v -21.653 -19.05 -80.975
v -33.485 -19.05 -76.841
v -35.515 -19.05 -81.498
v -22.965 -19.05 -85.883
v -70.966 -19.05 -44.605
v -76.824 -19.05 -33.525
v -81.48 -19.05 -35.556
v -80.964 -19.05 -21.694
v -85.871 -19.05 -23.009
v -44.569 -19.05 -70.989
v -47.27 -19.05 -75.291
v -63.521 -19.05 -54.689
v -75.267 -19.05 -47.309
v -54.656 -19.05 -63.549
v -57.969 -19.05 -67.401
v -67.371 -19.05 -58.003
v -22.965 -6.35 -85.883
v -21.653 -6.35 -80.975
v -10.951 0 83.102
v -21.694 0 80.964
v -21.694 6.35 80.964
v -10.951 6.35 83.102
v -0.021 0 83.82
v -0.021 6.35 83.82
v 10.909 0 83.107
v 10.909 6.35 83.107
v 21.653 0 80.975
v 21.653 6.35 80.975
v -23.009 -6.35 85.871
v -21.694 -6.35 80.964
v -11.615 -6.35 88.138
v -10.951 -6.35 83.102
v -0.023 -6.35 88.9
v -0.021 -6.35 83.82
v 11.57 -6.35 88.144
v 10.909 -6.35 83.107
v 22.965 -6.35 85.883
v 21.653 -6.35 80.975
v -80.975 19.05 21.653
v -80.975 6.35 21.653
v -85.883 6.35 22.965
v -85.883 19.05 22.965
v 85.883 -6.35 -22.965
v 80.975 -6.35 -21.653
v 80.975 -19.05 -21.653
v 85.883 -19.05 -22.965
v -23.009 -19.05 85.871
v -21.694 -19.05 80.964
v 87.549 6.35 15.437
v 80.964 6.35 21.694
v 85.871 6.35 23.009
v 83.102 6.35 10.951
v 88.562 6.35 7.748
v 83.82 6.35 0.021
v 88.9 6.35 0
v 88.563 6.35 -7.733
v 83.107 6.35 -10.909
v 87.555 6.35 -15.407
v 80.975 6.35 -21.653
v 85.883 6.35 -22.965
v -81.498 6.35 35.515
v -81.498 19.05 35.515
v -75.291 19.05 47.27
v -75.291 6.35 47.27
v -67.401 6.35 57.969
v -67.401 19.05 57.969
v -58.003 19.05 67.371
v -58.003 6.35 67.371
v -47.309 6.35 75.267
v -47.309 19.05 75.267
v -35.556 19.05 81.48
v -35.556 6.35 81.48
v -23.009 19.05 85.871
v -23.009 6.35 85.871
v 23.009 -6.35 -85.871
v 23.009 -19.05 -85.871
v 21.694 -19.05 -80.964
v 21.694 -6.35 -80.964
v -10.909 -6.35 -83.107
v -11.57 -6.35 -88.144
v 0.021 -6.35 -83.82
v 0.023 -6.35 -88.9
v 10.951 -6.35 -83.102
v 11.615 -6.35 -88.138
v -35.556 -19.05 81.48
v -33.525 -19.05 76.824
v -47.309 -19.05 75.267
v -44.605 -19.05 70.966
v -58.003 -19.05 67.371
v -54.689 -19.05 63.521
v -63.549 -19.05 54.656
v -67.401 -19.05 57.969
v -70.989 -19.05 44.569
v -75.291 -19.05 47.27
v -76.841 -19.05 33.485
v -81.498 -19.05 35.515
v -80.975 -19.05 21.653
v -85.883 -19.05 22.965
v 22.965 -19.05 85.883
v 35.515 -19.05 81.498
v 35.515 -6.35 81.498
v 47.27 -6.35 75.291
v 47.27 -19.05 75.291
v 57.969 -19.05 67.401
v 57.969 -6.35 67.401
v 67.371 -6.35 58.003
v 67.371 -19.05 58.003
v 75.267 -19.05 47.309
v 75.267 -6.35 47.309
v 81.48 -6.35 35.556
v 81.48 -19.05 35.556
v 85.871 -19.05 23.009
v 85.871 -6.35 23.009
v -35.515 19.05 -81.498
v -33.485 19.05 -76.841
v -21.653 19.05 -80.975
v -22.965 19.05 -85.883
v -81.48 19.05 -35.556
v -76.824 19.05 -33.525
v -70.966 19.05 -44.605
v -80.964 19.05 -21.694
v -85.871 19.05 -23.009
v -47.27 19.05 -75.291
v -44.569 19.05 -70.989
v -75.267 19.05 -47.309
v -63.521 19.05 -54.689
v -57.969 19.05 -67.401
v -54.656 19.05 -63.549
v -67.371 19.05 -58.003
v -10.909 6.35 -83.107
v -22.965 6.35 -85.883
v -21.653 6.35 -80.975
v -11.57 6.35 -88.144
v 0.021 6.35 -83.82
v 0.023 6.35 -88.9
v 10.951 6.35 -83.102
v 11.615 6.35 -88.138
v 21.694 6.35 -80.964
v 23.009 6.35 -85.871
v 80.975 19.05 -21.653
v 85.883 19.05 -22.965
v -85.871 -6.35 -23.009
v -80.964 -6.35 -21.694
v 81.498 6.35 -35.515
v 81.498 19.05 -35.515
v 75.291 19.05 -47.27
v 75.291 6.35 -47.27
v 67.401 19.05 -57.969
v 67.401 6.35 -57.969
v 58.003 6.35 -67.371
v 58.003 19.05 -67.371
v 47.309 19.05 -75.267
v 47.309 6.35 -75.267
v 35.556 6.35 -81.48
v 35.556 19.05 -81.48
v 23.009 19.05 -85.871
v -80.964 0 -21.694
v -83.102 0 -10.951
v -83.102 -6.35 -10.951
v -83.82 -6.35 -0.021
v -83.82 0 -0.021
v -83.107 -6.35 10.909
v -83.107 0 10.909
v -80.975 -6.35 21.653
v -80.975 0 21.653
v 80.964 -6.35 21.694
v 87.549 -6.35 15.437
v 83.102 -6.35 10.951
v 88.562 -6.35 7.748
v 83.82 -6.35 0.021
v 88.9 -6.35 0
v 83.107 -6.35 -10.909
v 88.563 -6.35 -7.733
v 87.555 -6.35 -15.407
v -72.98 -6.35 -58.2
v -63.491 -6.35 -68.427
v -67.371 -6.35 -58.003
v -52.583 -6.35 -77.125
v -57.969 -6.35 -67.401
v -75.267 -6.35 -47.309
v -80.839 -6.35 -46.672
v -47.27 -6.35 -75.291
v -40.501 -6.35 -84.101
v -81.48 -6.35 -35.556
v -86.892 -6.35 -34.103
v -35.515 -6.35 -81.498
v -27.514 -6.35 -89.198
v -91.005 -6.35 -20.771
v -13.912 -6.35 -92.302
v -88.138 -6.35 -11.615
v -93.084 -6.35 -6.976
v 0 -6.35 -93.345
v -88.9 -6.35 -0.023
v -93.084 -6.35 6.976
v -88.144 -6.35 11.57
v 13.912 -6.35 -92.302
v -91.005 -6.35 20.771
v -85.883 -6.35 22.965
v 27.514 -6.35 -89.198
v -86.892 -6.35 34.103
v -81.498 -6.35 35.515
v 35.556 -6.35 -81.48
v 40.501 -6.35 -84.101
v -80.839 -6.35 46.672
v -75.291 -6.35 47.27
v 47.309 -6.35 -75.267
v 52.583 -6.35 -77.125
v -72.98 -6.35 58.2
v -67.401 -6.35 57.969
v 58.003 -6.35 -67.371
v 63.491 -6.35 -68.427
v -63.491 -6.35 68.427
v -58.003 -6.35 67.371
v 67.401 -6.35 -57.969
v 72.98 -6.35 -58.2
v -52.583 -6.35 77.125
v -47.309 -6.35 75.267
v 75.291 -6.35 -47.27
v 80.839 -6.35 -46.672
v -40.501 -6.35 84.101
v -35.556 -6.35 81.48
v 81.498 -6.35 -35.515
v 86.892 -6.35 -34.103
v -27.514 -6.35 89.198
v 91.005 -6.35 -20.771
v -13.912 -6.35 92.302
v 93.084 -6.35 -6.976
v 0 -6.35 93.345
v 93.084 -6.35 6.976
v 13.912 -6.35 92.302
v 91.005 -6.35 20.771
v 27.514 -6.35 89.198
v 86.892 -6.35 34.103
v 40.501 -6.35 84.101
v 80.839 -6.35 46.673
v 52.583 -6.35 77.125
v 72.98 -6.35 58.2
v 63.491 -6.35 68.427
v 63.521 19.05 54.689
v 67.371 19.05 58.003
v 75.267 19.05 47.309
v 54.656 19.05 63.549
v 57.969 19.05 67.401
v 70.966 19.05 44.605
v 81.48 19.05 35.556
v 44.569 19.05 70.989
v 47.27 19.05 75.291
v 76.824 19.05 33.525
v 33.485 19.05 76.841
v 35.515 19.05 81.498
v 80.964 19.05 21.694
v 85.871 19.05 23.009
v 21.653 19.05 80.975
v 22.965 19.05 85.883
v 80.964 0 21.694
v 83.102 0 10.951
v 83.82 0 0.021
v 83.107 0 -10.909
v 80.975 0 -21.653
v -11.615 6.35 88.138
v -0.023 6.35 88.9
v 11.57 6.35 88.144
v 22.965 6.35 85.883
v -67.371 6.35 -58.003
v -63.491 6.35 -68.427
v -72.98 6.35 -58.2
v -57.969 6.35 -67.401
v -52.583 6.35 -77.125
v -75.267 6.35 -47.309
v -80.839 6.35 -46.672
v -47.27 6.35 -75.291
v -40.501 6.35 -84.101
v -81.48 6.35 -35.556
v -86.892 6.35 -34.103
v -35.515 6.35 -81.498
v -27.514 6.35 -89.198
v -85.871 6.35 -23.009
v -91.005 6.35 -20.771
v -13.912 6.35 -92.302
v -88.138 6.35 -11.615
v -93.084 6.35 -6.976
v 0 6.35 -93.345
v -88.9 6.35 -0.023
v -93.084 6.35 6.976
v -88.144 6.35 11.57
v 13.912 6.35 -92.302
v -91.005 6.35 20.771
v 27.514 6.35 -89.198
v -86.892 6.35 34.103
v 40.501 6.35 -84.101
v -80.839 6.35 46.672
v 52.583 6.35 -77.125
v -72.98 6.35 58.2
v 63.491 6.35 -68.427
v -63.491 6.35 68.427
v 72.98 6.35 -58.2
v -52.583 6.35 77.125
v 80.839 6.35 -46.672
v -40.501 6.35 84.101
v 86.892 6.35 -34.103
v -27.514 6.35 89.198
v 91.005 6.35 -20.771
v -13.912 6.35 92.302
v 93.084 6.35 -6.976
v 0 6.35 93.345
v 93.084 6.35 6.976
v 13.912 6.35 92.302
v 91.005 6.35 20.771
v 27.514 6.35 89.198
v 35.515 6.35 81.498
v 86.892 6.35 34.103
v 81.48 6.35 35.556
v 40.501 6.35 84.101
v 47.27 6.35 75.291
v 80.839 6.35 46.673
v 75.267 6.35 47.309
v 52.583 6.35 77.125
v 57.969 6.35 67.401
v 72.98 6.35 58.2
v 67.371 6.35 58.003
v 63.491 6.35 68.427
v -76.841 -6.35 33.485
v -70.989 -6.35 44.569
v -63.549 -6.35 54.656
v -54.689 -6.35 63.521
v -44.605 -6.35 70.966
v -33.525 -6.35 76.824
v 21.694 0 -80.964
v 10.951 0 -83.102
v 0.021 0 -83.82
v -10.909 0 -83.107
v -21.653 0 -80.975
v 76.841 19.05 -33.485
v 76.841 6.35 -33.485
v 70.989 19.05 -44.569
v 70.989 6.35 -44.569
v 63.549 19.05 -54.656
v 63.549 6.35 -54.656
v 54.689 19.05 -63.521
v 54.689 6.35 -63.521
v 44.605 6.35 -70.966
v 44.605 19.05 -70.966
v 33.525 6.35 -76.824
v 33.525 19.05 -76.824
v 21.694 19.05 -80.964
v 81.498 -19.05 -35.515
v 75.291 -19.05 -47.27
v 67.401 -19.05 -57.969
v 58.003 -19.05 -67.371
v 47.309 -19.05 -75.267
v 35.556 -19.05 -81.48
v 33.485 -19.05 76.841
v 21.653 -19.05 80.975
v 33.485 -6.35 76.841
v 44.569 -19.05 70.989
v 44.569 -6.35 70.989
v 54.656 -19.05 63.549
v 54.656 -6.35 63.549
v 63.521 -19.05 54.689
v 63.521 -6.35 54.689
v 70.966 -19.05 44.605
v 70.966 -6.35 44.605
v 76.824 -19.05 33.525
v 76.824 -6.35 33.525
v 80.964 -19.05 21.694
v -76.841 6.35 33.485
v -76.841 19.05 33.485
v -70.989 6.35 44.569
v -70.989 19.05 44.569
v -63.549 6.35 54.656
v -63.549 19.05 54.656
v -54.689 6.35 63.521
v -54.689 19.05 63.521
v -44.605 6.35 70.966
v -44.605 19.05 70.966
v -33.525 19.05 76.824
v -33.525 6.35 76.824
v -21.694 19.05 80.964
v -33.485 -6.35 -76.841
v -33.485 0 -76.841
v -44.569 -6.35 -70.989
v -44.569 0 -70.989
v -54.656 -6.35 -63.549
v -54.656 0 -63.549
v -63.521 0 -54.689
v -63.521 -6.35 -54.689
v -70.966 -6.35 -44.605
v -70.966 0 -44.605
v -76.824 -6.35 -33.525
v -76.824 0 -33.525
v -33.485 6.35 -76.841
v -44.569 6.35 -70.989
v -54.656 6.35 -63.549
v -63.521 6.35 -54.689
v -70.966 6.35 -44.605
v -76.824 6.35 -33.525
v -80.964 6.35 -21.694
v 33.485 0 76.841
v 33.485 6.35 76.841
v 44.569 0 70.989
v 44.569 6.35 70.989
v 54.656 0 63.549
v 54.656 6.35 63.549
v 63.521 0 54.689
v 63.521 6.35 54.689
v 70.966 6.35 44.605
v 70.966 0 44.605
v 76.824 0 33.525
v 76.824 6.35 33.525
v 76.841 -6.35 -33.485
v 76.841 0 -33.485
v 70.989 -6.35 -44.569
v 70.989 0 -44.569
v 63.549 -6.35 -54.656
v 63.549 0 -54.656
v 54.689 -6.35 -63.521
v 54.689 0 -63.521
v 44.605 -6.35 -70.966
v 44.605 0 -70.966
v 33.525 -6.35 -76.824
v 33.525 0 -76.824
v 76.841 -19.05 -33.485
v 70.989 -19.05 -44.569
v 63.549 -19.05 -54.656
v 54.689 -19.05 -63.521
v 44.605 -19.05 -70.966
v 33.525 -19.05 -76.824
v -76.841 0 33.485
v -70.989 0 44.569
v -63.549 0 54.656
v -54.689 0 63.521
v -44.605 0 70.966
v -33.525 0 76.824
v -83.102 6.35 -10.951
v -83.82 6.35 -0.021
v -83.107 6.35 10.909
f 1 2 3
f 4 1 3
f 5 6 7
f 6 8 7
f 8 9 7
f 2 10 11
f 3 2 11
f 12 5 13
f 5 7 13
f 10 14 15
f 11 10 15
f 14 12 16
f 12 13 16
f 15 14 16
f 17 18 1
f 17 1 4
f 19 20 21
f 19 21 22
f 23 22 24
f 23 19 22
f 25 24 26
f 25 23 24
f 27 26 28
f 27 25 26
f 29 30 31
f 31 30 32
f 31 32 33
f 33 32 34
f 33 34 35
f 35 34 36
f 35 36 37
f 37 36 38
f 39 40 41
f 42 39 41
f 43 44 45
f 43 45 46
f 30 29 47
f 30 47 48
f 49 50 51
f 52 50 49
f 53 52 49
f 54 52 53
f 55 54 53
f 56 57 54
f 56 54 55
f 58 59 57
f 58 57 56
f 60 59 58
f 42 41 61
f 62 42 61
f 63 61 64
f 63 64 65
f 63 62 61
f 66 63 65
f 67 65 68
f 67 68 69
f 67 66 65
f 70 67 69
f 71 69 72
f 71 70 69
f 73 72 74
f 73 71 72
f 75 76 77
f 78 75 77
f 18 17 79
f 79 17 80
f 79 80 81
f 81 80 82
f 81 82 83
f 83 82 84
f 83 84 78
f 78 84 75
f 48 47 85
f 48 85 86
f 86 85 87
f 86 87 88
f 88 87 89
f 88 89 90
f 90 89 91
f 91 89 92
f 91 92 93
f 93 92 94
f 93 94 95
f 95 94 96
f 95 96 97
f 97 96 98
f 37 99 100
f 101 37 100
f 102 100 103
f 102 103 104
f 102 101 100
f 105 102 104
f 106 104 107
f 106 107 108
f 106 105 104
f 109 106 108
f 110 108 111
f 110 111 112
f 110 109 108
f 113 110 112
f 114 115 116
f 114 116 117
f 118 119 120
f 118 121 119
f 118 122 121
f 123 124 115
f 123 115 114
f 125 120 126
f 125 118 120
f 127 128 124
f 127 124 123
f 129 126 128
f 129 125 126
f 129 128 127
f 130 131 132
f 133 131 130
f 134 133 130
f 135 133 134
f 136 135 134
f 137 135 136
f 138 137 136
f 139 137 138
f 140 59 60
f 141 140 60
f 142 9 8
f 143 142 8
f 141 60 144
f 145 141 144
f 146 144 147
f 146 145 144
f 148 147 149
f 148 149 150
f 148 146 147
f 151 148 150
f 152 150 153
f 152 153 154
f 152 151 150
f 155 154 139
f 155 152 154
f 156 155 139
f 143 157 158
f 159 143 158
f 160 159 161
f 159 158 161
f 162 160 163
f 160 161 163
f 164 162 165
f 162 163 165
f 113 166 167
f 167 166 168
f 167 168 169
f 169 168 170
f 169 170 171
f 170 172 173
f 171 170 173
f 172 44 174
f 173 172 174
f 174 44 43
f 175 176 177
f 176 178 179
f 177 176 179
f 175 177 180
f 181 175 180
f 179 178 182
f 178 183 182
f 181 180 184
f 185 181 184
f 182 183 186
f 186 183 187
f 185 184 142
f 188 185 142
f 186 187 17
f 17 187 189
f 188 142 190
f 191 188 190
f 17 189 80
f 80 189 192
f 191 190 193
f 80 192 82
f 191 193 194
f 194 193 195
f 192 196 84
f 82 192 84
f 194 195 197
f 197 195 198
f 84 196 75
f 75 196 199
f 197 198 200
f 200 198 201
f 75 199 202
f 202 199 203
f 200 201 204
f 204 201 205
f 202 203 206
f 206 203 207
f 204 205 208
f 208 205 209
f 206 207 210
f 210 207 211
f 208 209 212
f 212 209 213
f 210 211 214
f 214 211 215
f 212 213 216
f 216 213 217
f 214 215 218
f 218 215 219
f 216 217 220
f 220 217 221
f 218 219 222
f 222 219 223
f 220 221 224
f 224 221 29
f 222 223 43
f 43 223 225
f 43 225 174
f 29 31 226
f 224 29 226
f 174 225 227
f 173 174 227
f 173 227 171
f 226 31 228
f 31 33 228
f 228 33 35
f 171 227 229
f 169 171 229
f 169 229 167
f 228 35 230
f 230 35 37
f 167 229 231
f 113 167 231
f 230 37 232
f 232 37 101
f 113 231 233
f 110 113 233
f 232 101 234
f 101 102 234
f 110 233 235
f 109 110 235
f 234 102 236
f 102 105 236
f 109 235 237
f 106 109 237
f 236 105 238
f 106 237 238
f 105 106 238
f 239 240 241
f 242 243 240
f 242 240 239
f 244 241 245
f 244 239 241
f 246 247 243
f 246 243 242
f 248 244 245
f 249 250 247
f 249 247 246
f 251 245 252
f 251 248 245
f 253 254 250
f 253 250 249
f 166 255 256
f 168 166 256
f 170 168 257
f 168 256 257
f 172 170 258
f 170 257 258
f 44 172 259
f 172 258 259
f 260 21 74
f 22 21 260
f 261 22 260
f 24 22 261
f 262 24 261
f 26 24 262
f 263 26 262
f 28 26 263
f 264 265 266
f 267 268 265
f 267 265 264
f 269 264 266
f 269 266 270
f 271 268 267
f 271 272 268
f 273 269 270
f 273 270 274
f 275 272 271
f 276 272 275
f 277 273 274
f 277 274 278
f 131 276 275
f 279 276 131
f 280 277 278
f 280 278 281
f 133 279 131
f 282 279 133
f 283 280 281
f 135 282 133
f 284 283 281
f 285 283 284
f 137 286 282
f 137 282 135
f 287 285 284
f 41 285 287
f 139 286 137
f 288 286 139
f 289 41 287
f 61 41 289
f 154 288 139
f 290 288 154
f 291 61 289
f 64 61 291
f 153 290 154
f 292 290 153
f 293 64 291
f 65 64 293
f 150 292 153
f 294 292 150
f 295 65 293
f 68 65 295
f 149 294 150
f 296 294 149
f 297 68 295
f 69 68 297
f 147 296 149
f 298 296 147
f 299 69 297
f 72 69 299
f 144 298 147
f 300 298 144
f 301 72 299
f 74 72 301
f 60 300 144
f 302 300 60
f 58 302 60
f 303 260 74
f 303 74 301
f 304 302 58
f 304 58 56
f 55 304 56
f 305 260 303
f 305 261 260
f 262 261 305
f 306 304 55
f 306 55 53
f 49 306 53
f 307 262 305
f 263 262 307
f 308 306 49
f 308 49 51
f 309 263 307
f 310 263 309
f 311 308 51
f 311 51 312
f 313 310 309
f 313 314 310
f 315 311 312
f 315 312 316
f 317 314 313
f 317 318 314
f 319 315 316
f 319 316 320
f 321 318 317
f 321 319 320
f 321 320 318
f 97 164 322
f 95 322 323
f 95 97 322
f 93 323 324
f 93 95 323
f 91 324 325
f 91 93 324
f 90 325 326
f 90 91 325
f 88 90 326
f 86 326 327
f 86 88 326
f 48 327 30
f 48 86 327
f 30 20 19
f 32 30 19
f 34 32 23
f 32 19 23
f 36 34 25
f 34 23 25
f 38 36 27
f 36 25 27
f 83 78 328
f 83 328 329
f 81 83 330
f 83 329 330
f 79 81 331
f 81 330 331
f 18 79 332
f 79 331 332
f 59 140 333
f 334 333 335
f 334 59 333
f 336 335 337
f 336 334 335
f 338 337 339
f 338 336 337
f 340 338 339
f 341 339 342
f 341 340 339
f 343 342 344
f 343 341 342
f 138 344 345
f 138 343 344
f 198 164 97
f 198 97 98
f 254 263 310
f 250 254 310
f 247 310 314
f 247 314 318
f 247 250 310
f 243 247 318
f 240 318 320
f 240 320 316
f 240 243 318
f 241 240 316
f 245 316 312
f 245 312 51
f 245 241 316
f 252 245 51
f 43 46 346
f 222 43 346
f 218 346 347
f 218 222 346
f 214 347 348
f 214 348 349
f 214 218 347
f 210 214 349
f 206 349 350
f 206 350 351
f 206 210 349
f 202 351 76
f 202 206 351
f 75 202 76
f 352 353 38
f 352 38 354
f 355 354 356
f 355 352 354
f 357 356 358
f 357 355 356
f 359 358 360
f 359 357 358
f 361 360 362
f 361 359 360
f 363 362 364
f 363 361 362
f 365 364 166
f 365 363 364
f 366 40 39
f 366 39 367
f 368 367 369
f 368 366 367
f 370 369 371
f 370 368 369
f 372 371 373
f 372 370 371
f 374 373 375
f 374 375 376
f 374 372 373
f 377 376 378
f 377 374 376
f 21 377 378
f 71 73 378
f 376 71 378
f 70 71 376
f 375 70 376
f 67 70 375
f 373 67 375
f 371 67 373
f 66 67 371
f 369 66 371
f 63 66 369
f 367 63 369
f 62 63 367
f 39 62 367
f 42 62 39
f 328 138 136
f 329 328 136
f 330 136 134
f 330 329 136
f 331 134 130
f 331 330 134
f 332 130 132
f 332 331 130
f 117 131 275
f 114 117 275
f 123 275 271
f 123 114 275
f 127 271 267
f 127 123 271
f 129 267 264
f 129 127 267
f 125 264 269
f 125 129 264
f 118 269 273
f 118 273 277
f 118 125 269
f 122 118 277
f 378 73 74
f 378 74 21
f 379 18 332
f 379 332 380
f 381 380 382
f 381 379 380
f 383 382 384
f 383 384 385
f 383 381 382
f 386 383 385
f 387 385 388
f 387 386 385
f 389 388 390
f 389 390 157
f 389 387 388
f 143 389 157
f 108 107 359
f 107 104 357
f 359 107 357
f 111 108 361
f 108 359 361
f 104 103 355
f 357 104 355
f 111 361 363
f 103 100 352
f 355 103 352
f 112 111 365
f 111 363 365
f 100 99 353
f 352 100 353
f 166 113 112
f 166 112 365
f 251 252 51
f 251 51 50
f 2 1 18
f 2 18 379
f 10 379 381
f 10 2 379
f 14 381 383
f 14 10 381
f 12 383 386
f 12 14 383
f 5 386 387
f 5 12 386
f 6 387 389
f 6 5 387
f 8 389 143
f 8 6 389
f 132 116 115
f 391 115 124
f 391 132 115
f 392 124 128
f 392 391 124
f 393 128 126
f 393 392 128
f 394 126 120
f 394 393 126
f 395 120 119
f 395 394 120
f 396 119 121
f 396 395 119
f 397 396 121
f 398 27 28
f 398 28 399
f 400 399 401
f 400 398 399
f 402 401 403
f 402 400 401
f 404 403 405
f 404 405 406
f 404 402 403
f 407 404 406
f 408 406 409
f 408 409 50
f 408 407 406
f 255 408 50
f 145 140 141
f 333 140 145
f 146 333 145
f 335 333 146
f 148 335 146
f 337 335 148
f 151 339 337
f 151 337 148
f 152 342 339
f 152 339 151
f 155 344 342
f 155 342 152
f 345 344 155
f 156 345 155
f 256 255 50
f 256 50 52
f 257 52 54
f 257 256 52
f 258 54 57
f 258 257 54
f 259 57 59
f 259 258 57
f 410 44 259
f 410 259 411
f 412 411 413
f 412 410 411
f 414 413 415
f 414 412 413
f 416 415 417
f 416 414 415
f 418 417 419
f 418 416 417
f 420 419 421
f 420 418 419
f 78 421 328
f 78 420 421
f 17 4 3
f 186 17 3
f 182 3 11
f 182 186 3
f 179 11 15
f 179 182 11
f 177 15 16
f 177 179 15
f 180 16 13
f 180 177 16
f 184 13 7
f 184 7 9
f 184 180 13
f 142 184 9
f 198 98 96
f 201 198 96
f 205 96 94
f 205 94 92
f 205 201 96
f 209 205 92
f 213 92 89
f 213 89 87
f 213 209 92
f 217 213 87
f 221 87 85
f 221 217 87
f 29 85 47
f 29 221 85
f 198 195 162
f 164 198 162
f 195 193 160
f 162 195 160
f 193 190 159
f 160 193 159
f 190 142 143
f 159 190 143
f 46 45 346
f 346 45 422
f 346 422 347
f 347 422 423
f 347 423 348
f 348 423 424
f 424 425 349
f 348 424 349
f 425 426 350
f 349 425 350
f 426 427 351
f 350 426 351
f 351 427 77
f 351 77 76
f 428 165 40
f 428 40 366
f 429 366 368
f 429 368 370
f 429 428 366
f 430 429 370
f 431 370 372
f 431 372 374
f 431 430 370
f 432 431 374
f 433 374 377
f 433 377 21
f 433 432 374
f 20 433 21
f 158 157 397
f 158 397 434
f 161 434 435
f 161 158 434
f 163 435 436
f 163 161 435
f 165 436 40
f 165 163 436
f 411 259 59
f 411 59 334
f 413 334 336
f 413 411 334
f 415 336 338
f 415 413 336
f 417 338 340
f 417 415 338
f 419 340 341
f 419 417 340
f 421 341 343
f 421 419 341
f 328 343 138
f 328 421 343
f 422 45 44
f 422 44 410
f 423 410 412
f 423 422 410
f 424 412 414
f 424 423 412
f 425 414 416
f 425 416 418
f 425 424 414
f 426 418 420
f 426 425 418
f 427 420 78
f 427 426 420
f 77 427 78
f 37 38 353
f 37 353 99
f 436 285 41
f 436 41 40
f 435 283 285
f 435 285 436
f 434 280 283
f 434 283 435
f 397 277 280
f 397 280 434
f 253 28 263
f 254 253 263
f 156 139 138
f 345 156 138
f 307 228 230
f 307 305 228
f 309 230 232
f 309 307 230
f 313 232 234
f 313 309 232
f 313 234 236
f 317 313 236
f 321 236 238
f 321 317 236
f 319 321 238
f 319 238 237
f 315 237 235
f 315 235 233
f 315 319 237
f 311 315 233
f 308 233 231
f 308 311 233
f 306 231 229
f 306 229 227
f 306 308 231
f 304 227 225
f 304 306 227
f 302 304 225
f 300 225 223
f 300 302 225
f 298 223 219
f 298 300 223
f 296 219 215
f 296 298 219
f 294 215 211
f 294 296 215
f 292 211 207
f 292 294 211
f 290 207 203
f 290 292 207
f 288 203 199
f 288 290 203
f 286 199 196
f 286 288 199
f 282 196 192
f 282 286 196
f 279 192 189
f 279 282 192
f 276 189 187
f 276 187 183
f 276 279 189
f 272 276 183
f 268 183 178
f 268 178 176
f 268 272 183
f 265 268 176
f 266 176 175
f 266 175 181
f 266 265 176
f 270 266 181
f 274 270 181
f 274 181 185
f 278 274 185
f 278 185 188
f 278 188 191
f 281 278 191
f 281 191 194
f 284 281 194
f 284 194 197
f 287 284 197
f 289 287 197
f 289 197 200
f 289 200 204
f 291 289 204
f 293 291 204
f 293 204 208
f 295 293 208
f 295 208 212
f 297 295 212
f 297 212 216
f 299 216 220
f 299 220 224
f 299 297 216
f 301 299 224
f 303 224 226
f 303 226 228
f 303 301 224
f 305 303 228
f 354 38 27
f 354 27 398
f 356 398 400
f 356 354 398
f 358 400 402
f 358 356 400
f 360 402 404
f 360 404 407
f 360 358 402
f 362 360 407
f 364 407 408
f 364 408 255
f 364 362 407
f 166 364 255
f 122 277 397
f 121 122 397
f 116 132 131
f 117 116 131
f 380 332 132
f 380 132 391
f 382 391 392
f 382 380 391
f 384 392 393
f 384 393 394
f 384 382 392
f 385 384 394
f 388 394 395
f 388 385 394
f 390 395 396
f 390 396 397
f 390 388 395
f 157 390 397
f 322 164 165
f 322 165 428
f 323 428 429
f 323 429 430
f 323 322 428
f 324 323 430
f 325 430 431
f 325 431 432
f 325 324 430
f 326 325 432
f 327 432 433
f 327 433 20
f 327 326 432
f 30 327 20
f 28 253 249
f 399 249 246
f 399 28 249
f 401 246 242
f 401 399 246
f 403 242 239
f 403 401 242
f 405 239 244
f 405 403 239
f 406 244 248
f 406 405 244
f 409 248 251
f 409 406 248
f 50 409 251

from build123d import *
from build123d.topology import SkipClean

# Parameters (mm, degrees)
SKETCH1_R           = 93.345
SKETCH1_R_2         = 83.82
BOSS_EXTRUDE1_DEPTH = 6.35
SKETCH2_R           = 88.9
SKETCH2_R_2         = 83.82
BOSS_EXTRUDE2_DEPTH = 19.05
CUT_EXTRUDE1_DEPTH  = 38.1
CIRPATTERN1_COUNT   = 4
SKETCH4_R           = 88.9
SKETCH4_R_2         = 83.82
BOSS_EXTRUDE3_DEPTH = 6.35


with BuildPart() as part:
    # Sketch1 → Boss-Extrude1 (new, symmetric)
    with BuildSketch(Plane(origin=(0, 0, 0), x_dir=(1, 0, 0), z_dir=(0, 1, 0))):
        with Locations(Location((0, 0, 0), (0, 0, 270))):
            Circle(SKETCH1_R)
        with Locations(Location((0, 0, 0), (0, 0, 270))):
            Circle(SKETCH1_R_2, mode=Mode.SUBTRACT)
    extrude(amount=BOSS_EXTRUDE1_DEPTH, both=True)

    # Sketch2 → Boss-Extrude2 (add, symmetric)
    with BuildSketch(Plane(origin=(0, 0, 0), x_dir=(1, 0, 0), z_dir=(0, 1, 0))):
        with Locations(Location((0, 0, 0), (0, 0, 90))):
            Circle(SKETCH2_R)
        with Locations(Location((0, 0, 0), (0, 0, 270))):
            Circle(SKETCH2_R_2, mode=Mode.SUBTRACT)
    extrude(amount=BOSS_EXTRUDE2_DEPTH, both=True)

    # Sketch3 → Cut-Extrude1 (cut, symmetric)
    with BuildSketch(Plane(origin=(0, 0, 0), x_dir=(1, 0, 0), z_dir=(0, 1, 0))):
        with BuildLine():
            Line((0, 0), (-22.96498538, 85.882591056))
            ThreePointArc((-22.96498538, 85.882591056), (0.022788865, 88.899997079), (23.00901311, 85.870805957))
            Line((23.00901311, 85.870805957), (0, 0))
        make_face()
    cut_extrude1 = extrude(amount=CUT_EXTRUDE1_DEPTH, both=True, mode=Mode.SUBTRACT)

    # CirPattern1: Cut-Extrude1 ×4 about axis
    cirpattern1_axis = Axis((0, 19.05, 0), (0, -1, 0))
    for i in range(1, CIRPATTERN1_COUNT):
        add(cut_extrude1.rotate(cirpattern1_axis, i * 360 / CIRPATTERN1_COUNT), mode=Mode.SUBTRACT)

    # Sketch4 → Boss-Extrude3 (add, symmetric)
    with SkipClean():  # the faces are left unmerged after this step: merging them gives an invalid solid
        with BuildSketch(Plane(origin=(0, 0, 0), x_dir=(1, 0, 0), z_dir=(0, 1, 0))):
            Circle(SKETCH4_R)
            with Locations(Location((0, 0, 0), (0, 0, 104.970625291))):
                Circle(SKETCH4_R_2, mode=Mode.SUBTRACT)
        extrude(amount=BOSS_EXTRUDE3_DEPTH, both=True)


solid = part.part
